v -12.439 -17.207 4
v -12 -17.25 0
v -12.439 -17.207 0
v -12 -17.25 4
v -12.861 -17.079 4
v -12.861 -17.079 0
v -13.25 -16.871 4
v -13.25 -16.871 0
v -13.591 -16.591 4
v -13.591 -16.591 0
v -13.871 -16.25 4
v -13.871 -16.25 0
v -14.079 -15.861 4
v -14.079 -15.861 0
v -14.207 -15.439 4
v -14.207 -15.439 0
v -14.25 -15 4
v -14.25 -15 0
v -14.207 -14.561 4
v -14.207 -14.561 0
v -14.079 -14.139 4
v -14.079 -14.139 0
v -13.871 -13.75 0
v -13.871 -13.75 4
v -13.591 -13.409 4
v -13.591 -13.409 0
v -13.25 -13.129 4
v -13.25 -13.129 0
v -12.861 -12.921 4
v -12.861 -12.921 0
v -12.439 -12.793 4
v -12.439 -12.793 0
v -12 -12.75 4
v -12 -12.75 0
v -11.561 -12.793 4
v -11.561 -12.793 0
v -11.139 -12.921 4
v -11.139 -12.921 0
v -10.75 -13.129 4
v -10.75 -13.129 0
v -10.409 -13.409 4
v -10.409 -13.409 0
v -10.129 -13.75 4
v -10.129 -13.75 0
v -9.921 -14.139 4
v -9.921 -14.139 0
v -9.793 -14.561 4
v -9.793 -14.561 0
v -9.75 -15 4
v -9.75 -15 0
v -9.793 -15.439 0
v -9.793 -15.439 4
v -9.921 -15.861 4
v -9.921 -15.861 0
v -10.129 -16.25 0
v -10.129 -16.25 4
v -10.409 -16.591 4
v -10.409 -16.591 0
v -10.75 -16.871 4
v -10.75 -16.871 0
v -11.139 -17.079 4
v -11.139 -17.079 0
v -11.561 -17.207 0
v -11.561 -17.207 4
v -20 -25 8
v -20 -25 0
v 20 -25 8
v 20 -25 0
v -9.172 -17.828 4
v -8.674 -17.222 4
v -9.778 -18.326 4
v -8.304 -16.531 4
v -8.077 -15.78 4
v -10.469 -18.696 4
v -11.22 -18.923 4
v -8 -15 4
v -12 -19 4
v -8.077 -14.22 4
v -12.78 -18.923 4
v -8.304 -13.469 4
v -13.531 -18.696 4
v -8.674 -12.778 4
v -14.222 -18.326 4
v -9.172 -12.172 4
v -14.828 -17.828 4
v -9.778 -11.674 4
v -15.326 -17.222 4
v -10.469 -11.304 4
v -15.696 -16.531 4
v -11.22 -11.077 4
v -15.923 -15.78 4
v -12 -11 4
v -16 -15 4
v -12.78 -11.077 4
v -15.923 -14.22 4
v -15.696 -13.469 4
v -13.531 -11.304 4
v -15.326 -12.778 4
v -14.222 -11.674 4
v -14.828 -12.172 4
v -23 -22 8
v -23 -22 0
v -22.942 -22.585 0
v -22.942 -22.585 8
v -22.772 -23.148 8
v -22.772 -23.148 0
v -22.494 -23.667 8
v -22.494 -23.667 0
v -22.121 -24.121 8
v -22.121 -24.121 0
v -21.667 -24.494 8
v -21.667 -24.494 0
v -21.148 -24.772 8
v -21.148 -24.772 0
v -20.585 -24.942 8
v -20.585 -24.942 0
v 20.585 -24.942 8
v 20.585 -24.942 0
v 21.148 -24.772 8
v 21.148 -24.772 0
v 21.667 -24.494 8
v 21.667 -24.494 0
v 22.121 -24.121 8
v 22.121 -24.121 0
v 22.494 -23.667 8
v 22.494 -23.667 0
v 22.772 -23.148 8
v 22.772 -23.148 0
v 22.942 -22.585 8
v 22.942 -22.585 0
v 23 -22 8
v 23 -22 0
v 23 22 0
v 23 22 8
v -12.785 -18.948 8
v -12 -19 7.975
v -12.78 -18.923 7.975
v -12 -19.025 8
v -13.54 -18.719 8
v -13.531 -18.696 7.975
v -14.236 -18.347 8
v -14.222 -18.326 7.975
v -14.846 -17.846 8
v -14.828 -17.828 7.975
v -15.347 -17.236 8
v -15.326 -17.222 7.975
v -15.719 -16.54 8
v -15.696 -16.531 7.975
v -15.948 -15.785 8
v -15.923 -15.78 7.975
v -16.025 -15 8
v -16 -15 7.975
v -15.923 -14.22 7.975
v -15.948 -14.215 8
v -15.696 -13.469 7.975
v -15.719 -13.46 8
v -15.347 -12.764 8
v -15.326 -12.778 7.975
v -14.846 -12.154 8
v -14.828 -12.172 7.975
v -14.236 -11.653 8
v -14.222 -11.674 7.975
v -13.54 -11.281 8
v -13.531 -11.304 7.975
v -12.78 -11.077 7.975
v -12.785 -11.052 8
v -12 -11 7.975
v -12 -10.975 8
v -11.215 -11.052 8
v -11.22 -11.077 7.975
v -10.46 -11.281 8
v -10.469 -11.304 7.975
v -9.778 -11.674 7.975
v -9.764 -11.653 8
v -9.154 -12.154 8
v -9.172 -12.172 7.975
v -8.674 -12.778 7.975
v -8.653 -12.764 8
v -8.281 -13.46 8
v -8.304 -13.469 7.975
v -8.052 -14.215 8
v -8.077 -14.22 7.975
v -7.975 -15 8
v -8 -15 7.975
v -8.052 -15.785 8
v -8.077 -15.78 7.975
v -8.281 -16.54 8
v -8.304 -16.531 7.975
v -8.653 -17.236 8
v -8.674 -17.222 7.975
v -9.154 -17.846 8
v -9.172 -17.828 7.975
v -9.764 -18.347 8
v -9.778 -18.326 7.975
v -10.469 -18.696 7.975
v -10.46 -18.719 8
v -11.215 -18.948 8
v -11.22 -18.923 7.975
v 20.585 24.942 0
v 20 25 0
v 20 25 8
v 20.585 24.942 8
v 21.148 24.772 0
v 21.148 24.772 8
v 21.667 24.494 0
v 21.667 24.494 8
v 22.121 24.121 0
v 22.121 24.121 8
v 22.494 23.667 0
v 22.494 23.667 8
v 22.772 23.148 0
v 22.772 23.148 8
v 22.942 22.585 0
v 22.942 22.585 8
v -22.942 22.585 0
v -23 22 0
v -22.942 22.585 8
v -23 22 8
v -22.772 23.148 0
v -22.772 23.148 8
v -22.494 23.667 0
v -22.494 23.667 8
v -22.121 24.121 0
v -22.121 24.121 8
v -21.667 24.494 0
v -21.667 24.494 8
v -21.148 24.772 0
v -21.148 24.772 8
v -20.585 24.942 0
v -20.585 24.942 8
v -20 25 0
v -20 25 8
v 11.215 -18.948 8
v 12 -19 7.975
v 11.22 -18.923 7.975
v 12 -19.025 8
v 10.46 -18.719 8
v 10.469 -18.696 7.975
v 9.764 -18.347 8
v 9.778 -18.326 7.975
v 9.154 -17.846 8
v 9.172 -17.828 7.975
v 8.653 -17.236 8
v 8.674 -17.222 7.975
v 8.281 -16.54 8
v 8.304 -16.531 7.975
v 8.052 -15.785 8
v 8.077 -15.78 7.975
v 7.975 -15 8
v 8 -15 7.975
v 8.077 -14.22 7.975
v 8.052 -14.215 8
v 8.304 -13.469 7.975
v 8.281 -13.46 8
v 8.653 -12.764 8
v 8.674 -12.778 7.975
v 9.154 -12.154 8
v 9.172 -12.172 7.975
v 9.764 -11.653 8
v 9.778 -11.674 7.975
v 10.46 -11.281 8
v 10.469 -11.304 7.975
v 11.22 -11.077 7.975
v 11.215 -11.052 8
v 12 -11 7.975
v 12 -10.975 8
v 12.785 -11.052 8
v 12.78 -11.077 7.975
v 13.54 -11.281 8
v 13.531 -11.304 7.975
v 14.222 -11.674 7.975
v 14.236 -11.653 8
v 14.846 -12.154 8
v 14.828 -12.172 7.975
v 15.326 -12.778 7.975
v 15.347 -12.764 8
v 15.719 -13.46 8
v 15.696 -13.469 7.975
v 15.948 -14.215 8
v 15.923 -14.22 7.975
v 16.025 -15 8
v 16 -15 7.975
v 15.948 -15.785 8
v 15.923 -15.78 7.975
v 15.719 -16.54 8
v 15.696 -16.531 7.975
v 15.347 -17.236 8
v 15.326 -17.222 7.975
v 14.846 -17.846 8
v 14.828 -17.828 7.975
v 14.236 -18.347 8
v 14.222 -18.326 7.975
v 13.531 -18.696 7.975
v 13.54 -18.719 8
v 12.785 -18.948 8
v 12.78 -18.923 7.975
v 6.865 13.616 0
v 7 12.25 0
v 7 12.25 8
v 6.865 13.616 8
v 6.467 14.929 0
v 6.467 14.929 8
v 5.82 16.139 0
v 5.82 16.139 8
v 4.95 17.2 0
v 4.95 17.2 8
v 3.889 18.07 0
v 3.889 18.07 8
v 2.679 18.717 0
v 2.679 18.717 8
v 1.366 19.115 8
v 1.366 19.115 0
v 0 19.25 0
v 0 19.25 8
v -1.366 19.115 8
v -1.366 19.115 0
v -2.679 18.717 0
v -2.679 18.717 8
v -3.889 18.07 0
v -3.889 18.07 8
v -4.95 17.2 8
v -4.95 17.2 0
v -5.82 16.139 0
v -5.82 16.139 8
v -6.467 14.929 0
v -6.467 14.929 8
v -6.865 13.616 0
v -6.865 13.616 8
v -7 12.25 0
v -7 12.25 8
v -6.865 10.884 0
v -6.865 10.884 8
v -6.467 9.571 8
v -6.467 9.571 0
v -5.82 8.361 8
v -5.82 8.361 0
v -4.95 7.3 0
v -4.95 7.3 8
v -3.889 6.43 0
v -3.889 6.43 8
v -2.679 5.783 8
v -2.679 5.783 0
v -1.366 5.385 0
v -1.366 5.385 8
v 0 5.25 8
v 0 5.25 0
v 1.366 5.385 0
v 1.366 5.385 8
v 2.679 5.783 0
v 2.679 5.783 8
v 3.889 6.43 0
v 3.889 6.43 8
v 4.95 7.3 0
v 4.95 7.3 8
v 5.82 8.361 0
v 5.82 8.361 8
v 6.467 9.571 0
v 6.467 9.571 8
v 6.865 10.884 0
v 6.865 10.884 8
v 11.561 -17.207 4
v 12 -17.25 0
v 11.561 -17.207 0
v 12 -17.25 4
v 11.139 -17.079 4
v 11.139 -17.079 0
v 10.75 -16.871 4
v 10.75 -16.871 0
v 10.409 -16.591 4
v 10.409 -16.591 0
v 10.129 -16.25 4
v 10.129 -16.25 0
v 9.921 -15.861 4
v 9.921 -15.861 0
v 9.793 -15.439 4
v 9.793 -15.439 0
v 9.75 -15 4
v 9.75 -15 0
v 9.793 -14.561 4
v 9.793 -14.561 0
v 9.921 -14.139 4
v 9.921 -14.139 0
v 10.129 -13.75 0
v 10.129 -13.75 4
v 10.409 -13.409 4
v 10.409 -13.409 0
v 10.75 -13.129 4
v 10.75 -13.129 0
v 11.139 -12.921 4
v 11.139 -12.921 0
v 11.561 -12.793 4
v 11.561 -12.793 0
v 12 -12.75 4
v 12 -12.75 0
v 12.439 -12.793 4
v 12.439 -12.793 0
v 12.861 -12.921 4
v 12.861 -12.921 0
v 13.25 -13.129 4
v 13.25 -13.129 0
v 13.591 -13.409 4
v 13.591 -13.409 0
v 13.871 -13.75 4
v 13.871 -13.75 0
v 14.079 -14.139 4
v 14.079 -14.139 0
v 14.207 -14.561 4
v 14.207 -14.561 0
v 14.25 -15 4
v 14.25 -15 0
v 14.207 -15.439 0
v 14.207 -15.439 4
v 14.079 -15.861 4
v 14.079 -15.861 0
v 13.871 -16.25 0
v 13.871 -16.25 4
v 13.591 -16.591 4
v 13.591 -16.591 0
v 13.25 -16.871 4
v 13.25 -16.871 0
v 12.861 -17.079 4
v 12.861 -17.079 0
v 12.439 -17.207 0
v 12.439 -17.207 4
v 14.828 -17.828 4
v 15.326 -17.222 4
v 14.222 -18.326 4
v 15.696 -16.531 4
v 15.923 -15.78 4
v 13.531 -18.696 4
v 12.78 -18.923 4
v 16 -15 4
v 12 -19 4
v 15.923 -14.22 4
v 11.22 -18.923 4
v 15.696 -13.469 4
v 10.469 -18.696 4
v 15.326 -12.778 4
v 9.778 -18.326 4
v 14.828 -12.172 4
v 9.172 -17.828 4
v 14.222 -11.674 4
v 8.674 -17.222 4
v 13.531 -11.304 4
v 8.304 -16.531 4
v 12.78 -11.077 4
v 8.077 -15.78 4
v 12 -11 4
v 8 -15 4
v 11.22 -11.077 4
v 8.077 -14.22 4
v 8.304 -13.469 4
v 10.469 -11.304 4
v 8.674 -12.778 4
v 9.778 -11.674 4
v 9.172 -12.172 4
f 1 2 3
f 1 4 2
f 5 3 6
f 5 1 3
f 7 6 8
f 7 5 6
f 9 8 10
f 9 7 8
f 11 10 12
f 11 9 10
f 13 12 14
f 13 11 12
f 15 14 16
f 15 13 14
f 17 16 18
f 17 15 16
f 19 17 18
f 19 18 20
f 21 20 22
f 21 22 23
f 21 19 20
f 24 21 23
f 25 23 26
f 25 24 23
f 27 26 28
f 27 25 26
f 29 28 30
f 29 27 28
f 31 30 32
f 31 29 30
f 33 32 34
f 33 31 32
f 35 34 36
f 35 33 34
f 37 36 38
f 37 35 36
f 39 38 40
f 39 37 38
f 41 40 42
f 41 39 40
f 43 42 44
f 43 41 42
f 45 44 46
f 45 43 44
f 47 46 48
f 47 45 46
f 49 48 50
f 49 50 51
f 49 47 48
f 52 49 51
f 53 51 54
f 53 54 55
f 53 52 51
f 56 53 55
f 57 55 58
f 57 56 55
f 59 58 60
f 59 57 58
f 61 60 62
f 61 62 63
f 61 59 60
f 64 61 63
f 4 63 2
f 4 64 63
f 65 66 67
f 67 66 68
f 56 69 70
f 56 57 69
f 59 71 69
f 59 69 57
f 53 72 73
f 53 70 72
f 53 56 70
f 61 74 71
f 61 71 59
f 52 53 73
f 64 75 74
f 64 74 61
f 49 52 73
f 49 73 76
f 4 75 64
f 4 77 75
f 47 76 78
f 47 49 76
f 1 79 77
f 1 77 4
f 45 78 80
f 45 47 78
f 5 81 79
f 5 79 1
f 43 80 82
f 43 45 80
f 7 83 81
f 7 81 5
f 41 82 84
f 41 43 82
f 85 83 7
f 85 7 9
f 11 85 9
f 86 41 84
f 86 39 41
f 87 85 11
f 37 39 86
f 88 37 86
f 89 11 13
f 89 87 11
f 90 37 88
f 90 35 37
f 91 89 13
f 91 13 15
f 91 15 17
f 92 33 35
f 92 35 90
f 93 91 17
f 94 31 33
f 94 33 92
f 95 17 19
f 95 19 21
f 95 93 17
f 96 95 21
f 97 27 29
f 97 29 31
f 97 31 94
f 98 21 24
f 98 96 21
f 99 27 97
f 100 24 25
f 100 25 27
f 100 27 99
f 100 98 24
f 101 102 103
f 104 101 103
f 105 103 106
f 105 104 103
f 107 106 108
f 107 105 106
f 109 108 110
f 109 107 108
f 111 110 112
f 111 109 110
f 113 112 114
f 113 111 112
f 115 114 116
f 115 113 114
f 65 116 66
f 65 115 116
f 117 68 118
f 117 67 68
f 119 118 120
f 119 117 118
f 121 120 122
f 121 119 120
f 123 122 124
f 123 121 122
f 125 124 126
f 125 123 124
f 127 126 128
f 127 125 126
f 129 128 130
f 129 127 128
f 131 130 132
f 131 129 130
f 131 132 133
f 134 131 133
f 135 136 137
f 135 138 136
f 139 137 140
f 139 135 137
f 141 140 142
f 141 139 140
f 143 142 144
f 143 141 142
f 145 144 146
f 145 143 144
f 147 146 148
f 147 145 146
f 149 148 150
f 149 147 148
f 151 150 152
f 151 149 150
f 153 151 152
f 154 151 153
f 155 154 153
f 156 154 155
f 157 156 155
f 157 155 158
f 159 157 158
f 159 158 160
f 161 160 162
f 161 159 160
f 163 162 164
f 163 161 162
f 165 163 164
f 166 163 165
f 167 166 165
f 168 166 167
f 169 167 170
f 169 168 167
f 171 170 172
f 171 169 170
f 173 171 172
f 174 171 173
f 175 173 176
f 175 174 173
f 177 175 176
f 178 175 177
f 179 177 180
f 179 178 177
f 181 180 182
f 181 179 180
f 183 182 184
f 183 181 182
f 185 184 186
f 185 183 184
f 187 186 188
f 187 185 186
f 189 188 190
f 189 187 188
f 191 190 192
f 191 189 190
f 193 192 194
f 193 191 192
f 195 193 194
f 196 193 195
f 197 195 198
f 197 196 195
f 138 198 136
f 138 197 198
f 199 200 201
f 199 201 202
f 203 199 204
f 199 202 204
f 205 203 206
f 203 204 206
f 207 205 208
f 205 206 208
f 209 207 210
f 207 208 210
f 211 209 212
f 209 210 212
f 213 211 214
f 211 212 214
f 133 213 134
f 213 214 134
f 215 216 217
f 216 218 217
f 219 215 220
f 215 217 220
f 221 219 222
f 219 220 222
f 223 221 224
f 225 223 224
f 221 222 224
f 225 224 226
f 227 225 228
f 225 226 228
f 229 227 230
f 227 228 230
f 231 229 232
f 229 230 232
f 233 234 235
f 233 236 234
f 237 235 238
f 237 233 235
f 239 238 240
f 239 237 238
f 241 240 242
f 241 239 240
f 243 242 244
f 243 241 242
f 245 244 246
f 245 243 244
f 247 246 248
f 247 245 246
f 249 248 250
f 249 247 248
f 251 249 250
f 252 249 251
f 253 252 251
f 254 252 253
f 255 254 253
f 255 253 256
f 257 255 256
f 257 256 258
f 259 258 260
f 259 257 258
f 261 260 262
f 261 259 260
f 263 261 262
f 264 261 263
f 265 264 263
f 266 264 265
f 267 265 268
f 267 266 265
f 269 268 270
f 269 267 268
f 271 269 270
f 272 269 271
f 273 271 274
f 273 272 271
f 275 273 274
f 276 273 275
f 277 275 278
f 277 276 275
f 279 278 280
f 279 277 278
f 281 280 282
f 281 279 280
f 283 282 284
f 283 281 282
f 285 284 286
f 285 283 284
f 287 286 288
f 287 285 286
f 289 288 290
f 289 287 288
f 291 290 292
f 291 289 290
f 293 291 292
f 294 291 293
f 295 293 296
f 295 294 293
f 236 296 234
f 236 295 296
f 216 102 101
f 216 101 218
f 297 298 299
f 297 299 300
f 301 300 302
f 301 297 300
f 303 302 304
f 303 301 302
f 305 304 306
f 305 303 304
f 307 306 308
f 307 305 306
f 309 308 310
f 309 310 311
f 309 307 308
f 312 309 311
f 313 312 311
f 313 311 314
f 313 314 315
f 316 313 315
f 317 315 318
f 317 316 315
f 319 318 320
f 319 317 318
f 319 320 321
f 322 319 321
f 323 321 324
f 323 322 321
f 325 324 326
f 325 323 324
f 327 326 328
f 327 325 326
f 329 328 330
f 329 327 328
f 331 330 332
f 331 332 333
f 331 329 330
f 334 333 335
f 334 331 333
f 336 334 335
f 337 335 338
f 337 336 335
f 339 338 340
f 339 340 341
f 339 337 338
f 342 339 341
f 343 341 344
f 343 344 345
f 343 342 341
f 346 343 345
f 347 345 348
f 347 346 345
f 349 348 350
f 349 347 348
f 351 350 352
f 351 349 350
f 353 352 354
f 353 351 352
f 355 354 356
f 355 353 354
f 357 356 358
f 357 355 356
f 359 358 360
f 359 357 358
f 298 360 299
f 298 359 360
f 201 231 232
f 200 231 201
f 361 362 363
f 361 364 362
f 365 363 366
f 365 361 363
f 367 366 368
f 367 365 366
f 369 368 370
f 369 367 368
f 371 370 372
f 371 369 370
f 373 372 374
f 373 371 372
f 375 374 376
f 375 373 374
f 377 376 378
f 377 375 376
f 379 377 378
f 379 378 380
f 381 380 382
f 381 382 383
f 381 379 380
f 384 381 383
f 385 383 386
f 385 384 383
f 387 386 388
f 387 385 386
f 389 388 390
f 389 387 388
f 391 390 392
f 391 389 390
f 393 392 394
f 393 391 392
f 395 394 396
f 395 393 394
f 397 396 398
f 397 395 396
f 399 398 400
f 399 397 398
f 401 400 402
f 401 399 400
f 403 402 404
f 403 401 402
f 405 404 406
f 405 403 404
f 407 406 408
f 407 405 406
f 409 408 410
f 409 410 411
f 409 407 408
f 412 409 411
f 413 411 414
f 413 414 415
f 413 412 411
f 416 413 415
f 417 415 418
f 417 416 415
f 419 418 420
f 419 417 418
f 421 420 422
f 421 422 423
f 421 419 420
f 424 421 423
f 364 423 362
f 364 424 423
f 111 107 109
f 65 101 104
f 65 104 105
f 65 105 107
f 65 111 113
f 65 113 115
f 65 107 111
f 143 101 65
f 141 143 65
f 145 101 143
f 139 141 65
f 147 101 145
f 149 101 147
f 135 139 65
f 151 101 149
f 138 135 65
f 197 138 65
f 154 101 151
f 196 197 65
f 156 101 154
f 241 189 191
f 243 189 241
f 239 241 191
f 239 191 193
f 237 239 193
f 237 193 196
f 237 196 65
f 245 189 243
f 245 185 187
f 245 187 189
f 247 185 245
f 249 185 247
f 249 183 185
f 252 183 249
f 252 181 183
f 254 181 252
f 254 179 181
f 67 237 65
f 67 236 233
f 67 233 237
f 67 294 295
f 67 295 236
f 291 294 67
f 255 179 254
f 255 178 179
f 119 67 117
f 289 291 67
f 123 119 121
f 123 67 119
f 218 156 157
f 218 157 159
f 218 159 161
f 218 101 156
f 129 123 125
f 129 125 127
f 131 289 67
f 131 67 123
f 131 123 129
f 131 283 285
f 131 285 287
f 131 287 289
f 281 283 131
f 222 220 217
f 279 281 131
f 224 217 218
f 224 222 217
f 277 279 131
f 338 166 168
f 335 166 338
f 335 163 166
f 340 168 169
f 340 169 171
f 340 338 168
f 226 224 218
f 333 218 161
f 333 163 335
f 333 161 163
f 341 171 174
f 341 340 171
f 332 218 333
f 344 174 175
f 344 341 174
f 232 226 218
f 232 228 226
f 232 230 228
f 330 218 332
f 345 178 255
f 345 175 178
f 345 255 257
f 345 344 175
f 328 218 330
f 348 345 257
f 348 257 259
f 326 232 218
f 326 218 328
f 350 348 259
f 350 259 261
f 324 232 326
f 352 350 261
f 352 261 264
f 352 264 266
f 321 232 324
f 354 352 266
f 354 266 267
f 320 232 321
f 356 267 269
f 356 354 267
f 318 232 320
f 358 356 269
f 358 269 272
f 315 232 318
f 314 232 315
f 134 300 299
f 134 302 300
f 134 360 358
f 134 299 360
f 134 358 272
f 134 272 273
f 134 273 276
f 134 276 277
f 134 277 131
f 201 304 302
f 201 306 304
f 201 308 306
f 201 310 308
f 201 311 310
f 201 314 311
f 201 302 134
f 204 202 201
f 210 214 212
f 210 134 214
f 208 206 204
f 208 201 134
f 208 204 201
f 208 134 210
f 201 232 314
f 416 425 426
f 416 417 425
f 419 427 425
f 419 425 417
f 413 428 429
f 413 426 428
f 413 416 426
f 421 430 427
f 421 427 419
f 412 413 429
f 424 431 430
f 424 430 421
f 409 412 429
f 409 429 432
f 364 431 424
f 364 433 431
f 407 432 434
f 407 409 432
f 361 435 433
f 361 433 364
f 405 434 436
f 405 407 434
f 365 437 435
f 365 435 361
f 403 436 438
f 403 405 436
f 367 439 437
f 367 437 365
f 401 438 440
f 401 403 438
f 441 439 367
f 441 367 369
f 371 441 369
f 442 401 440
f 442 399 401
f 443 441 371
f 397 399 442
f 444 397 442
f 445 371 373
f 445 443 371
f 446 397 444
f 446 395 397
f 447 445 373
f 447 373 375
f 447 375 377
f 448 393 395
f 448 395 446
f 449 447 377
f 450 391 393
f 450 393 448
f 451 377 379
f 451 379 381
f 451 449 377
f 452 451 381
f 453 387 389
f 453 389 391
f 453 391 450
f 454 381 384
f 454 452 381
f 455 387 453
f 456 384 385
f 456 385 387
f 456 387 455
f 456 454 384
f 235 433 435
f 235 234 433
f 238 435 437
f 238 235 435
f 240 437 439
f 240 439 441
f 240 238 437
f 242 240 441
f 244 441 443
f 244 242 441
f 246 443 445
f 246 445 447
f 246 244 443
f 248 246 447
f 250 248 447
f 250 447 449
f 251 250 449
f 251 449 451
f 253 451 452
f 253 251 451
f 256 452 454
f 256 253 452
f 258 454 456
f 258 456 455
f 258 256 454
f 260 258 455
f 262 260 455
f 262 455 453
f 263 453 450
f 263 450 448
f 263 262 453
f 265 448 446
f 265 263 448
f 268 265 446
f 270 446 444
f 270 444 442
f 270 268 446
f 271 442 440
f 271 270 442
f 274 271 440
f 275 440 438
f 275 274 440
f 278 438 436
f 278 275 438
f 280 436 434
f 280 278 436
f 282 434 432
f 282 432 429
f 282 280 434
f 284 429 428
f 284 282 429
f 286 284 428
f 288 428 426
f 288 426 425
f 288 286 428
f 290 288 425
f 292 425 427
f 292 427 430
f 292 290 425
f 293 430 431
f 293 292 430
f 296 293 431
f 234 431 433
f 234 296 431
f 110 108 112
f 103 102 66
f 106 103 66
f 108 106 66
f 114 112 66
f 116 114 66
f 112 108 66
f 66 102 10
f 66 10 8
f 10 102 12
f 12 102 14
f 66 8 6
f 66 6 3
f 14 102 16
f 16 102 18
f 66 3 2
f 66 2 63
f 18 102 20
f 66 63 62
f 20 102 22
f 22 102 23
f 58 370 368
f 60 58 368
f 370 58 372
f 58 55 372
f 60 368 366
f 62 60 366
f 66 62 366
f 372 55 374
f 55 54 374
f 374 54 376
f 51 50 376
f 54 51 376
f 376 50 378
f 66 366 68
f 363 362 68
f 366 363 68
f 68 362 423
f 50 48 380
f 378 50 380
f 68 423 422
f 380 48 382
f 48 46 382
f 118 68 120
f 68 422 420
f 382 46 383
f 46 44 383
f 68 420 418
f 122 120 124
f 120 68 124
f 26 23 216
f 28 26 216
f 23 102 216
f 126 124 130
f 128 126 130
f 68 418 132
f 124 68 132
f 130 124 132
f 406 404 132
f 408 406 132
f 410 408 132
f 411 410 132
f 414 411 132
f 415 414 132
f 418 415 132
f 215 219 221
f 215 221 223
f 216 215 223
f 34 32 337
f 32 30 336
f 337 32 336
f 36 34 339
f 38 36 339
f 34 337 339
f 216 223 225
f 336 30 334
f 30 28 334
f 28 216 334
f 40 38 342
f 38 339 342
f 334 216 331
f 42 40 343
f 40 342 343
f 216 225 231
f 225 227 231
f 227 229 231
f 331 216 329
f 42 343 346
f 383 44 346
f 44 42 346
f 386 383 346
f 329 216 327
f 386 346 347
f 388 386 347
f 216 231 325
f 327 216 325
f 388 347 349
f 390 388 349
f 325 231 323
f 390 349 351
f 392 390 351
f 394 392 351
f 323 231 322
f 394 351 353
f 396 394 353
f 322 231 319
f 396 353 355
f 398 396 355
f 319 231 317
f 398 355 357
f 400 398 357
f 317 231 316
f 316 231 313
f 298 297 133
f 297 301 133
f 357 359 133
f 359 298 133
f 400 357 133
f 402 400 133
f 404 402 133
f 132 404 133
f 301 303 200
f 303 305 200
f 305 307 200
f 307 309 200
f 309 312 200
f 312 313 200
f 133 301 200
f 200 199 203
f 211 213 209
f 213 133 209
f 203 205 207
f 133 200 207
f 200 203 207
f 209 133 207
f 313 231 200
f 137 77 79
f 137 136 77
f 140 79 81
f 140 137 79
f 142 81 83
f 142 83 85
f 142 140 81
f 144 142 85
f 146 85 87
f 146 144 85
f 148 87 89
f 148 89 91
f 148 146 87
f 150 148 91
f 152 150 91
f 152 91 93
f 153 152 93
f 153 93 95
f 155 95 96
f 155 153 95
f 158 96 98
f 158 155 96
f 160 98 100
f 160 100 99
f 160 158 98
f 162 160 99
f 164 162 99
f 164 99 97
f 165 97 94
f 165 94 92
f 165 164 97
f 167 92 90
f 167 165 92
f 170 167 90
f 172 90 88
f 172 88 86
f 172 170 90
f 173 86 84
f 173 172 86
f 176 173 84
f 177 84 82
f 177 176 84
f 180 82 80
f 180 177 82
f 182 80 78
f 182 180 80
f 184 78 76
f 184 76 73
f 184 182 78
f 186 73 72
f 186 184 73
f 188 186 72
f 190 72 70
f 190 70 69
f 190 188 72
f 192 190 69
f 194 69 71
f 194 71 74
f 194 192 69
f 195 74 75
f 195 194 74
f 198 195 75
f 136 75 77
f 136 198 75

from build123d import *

# Parameters (mm, degrees)
SKETCH1_W                     = 46
SKETCH1_H                     = 50
SKETCH1_R                     = 7
BOSS_EXTRUDE1_DEPTH           = 8
FILLET1_R                     = 3
CBORE_FOR_M4_SHCS1_AT_2_COUNT = 2
CBORE_FOR_M4_SHCS1_AT_2_PITCH = 24


with BuildPart() as part:
    # Sketch1 → Boss-Extrude1 (new body)
    with BuildSketch(Plane.XY):
        Rectangle(SKETCH1_W, SKETCH1_H)
        with Locations((0, 12.25)):
            Circle(SKETCH1_R, mode=Mode.SUBTRACT)
    extrude(amount=BOSS_EXTRUDE1_DEPTH)

    # Fillet1
    fillet1_edges = [part.edges().sort_by_distance(p)[0] for p in [
        (23, -25, 4),
        (-23, -25, 4),
        (-23, 25, 4),
        (23, 25, 4),
    ]]
    fillet(fillet1_edges, radius=FILLET1_R)

    # Sketch3 → CBORE for M4 SHCS1 (revolve, cut)
    with BuildSketch(Plane(origin=(-12, -15, 8), x_dir=(0, -1, 0), z_dir=(1, 0, 0))):
        Polygon((0, 0), (0, 8), (2.25, 8), (2.25, 4), (4, 4), (4, 0.025), (4.025, 0), align=None)
    cbore_for_m4_shcs1 = revolve(axis=Axis((-12, -15, 14.35), (0, 0, -1)), mode=Mode.SUBTRACT)

    # CBORE for M4 SHCS1 at 2: CBORE for M4 SHCS1 ×2
    with Locations(*[(i * CBORE_FOR_M4_SHCS1_AT_2_PITCH, 0, 0) for i in range(1, CBORE_FOR_M4_SHCS1_AT_2_COUNT)]):
        add(cbore_for_m4_shcs1, mode=Mode.SUBTRACT)


solid = part.part
